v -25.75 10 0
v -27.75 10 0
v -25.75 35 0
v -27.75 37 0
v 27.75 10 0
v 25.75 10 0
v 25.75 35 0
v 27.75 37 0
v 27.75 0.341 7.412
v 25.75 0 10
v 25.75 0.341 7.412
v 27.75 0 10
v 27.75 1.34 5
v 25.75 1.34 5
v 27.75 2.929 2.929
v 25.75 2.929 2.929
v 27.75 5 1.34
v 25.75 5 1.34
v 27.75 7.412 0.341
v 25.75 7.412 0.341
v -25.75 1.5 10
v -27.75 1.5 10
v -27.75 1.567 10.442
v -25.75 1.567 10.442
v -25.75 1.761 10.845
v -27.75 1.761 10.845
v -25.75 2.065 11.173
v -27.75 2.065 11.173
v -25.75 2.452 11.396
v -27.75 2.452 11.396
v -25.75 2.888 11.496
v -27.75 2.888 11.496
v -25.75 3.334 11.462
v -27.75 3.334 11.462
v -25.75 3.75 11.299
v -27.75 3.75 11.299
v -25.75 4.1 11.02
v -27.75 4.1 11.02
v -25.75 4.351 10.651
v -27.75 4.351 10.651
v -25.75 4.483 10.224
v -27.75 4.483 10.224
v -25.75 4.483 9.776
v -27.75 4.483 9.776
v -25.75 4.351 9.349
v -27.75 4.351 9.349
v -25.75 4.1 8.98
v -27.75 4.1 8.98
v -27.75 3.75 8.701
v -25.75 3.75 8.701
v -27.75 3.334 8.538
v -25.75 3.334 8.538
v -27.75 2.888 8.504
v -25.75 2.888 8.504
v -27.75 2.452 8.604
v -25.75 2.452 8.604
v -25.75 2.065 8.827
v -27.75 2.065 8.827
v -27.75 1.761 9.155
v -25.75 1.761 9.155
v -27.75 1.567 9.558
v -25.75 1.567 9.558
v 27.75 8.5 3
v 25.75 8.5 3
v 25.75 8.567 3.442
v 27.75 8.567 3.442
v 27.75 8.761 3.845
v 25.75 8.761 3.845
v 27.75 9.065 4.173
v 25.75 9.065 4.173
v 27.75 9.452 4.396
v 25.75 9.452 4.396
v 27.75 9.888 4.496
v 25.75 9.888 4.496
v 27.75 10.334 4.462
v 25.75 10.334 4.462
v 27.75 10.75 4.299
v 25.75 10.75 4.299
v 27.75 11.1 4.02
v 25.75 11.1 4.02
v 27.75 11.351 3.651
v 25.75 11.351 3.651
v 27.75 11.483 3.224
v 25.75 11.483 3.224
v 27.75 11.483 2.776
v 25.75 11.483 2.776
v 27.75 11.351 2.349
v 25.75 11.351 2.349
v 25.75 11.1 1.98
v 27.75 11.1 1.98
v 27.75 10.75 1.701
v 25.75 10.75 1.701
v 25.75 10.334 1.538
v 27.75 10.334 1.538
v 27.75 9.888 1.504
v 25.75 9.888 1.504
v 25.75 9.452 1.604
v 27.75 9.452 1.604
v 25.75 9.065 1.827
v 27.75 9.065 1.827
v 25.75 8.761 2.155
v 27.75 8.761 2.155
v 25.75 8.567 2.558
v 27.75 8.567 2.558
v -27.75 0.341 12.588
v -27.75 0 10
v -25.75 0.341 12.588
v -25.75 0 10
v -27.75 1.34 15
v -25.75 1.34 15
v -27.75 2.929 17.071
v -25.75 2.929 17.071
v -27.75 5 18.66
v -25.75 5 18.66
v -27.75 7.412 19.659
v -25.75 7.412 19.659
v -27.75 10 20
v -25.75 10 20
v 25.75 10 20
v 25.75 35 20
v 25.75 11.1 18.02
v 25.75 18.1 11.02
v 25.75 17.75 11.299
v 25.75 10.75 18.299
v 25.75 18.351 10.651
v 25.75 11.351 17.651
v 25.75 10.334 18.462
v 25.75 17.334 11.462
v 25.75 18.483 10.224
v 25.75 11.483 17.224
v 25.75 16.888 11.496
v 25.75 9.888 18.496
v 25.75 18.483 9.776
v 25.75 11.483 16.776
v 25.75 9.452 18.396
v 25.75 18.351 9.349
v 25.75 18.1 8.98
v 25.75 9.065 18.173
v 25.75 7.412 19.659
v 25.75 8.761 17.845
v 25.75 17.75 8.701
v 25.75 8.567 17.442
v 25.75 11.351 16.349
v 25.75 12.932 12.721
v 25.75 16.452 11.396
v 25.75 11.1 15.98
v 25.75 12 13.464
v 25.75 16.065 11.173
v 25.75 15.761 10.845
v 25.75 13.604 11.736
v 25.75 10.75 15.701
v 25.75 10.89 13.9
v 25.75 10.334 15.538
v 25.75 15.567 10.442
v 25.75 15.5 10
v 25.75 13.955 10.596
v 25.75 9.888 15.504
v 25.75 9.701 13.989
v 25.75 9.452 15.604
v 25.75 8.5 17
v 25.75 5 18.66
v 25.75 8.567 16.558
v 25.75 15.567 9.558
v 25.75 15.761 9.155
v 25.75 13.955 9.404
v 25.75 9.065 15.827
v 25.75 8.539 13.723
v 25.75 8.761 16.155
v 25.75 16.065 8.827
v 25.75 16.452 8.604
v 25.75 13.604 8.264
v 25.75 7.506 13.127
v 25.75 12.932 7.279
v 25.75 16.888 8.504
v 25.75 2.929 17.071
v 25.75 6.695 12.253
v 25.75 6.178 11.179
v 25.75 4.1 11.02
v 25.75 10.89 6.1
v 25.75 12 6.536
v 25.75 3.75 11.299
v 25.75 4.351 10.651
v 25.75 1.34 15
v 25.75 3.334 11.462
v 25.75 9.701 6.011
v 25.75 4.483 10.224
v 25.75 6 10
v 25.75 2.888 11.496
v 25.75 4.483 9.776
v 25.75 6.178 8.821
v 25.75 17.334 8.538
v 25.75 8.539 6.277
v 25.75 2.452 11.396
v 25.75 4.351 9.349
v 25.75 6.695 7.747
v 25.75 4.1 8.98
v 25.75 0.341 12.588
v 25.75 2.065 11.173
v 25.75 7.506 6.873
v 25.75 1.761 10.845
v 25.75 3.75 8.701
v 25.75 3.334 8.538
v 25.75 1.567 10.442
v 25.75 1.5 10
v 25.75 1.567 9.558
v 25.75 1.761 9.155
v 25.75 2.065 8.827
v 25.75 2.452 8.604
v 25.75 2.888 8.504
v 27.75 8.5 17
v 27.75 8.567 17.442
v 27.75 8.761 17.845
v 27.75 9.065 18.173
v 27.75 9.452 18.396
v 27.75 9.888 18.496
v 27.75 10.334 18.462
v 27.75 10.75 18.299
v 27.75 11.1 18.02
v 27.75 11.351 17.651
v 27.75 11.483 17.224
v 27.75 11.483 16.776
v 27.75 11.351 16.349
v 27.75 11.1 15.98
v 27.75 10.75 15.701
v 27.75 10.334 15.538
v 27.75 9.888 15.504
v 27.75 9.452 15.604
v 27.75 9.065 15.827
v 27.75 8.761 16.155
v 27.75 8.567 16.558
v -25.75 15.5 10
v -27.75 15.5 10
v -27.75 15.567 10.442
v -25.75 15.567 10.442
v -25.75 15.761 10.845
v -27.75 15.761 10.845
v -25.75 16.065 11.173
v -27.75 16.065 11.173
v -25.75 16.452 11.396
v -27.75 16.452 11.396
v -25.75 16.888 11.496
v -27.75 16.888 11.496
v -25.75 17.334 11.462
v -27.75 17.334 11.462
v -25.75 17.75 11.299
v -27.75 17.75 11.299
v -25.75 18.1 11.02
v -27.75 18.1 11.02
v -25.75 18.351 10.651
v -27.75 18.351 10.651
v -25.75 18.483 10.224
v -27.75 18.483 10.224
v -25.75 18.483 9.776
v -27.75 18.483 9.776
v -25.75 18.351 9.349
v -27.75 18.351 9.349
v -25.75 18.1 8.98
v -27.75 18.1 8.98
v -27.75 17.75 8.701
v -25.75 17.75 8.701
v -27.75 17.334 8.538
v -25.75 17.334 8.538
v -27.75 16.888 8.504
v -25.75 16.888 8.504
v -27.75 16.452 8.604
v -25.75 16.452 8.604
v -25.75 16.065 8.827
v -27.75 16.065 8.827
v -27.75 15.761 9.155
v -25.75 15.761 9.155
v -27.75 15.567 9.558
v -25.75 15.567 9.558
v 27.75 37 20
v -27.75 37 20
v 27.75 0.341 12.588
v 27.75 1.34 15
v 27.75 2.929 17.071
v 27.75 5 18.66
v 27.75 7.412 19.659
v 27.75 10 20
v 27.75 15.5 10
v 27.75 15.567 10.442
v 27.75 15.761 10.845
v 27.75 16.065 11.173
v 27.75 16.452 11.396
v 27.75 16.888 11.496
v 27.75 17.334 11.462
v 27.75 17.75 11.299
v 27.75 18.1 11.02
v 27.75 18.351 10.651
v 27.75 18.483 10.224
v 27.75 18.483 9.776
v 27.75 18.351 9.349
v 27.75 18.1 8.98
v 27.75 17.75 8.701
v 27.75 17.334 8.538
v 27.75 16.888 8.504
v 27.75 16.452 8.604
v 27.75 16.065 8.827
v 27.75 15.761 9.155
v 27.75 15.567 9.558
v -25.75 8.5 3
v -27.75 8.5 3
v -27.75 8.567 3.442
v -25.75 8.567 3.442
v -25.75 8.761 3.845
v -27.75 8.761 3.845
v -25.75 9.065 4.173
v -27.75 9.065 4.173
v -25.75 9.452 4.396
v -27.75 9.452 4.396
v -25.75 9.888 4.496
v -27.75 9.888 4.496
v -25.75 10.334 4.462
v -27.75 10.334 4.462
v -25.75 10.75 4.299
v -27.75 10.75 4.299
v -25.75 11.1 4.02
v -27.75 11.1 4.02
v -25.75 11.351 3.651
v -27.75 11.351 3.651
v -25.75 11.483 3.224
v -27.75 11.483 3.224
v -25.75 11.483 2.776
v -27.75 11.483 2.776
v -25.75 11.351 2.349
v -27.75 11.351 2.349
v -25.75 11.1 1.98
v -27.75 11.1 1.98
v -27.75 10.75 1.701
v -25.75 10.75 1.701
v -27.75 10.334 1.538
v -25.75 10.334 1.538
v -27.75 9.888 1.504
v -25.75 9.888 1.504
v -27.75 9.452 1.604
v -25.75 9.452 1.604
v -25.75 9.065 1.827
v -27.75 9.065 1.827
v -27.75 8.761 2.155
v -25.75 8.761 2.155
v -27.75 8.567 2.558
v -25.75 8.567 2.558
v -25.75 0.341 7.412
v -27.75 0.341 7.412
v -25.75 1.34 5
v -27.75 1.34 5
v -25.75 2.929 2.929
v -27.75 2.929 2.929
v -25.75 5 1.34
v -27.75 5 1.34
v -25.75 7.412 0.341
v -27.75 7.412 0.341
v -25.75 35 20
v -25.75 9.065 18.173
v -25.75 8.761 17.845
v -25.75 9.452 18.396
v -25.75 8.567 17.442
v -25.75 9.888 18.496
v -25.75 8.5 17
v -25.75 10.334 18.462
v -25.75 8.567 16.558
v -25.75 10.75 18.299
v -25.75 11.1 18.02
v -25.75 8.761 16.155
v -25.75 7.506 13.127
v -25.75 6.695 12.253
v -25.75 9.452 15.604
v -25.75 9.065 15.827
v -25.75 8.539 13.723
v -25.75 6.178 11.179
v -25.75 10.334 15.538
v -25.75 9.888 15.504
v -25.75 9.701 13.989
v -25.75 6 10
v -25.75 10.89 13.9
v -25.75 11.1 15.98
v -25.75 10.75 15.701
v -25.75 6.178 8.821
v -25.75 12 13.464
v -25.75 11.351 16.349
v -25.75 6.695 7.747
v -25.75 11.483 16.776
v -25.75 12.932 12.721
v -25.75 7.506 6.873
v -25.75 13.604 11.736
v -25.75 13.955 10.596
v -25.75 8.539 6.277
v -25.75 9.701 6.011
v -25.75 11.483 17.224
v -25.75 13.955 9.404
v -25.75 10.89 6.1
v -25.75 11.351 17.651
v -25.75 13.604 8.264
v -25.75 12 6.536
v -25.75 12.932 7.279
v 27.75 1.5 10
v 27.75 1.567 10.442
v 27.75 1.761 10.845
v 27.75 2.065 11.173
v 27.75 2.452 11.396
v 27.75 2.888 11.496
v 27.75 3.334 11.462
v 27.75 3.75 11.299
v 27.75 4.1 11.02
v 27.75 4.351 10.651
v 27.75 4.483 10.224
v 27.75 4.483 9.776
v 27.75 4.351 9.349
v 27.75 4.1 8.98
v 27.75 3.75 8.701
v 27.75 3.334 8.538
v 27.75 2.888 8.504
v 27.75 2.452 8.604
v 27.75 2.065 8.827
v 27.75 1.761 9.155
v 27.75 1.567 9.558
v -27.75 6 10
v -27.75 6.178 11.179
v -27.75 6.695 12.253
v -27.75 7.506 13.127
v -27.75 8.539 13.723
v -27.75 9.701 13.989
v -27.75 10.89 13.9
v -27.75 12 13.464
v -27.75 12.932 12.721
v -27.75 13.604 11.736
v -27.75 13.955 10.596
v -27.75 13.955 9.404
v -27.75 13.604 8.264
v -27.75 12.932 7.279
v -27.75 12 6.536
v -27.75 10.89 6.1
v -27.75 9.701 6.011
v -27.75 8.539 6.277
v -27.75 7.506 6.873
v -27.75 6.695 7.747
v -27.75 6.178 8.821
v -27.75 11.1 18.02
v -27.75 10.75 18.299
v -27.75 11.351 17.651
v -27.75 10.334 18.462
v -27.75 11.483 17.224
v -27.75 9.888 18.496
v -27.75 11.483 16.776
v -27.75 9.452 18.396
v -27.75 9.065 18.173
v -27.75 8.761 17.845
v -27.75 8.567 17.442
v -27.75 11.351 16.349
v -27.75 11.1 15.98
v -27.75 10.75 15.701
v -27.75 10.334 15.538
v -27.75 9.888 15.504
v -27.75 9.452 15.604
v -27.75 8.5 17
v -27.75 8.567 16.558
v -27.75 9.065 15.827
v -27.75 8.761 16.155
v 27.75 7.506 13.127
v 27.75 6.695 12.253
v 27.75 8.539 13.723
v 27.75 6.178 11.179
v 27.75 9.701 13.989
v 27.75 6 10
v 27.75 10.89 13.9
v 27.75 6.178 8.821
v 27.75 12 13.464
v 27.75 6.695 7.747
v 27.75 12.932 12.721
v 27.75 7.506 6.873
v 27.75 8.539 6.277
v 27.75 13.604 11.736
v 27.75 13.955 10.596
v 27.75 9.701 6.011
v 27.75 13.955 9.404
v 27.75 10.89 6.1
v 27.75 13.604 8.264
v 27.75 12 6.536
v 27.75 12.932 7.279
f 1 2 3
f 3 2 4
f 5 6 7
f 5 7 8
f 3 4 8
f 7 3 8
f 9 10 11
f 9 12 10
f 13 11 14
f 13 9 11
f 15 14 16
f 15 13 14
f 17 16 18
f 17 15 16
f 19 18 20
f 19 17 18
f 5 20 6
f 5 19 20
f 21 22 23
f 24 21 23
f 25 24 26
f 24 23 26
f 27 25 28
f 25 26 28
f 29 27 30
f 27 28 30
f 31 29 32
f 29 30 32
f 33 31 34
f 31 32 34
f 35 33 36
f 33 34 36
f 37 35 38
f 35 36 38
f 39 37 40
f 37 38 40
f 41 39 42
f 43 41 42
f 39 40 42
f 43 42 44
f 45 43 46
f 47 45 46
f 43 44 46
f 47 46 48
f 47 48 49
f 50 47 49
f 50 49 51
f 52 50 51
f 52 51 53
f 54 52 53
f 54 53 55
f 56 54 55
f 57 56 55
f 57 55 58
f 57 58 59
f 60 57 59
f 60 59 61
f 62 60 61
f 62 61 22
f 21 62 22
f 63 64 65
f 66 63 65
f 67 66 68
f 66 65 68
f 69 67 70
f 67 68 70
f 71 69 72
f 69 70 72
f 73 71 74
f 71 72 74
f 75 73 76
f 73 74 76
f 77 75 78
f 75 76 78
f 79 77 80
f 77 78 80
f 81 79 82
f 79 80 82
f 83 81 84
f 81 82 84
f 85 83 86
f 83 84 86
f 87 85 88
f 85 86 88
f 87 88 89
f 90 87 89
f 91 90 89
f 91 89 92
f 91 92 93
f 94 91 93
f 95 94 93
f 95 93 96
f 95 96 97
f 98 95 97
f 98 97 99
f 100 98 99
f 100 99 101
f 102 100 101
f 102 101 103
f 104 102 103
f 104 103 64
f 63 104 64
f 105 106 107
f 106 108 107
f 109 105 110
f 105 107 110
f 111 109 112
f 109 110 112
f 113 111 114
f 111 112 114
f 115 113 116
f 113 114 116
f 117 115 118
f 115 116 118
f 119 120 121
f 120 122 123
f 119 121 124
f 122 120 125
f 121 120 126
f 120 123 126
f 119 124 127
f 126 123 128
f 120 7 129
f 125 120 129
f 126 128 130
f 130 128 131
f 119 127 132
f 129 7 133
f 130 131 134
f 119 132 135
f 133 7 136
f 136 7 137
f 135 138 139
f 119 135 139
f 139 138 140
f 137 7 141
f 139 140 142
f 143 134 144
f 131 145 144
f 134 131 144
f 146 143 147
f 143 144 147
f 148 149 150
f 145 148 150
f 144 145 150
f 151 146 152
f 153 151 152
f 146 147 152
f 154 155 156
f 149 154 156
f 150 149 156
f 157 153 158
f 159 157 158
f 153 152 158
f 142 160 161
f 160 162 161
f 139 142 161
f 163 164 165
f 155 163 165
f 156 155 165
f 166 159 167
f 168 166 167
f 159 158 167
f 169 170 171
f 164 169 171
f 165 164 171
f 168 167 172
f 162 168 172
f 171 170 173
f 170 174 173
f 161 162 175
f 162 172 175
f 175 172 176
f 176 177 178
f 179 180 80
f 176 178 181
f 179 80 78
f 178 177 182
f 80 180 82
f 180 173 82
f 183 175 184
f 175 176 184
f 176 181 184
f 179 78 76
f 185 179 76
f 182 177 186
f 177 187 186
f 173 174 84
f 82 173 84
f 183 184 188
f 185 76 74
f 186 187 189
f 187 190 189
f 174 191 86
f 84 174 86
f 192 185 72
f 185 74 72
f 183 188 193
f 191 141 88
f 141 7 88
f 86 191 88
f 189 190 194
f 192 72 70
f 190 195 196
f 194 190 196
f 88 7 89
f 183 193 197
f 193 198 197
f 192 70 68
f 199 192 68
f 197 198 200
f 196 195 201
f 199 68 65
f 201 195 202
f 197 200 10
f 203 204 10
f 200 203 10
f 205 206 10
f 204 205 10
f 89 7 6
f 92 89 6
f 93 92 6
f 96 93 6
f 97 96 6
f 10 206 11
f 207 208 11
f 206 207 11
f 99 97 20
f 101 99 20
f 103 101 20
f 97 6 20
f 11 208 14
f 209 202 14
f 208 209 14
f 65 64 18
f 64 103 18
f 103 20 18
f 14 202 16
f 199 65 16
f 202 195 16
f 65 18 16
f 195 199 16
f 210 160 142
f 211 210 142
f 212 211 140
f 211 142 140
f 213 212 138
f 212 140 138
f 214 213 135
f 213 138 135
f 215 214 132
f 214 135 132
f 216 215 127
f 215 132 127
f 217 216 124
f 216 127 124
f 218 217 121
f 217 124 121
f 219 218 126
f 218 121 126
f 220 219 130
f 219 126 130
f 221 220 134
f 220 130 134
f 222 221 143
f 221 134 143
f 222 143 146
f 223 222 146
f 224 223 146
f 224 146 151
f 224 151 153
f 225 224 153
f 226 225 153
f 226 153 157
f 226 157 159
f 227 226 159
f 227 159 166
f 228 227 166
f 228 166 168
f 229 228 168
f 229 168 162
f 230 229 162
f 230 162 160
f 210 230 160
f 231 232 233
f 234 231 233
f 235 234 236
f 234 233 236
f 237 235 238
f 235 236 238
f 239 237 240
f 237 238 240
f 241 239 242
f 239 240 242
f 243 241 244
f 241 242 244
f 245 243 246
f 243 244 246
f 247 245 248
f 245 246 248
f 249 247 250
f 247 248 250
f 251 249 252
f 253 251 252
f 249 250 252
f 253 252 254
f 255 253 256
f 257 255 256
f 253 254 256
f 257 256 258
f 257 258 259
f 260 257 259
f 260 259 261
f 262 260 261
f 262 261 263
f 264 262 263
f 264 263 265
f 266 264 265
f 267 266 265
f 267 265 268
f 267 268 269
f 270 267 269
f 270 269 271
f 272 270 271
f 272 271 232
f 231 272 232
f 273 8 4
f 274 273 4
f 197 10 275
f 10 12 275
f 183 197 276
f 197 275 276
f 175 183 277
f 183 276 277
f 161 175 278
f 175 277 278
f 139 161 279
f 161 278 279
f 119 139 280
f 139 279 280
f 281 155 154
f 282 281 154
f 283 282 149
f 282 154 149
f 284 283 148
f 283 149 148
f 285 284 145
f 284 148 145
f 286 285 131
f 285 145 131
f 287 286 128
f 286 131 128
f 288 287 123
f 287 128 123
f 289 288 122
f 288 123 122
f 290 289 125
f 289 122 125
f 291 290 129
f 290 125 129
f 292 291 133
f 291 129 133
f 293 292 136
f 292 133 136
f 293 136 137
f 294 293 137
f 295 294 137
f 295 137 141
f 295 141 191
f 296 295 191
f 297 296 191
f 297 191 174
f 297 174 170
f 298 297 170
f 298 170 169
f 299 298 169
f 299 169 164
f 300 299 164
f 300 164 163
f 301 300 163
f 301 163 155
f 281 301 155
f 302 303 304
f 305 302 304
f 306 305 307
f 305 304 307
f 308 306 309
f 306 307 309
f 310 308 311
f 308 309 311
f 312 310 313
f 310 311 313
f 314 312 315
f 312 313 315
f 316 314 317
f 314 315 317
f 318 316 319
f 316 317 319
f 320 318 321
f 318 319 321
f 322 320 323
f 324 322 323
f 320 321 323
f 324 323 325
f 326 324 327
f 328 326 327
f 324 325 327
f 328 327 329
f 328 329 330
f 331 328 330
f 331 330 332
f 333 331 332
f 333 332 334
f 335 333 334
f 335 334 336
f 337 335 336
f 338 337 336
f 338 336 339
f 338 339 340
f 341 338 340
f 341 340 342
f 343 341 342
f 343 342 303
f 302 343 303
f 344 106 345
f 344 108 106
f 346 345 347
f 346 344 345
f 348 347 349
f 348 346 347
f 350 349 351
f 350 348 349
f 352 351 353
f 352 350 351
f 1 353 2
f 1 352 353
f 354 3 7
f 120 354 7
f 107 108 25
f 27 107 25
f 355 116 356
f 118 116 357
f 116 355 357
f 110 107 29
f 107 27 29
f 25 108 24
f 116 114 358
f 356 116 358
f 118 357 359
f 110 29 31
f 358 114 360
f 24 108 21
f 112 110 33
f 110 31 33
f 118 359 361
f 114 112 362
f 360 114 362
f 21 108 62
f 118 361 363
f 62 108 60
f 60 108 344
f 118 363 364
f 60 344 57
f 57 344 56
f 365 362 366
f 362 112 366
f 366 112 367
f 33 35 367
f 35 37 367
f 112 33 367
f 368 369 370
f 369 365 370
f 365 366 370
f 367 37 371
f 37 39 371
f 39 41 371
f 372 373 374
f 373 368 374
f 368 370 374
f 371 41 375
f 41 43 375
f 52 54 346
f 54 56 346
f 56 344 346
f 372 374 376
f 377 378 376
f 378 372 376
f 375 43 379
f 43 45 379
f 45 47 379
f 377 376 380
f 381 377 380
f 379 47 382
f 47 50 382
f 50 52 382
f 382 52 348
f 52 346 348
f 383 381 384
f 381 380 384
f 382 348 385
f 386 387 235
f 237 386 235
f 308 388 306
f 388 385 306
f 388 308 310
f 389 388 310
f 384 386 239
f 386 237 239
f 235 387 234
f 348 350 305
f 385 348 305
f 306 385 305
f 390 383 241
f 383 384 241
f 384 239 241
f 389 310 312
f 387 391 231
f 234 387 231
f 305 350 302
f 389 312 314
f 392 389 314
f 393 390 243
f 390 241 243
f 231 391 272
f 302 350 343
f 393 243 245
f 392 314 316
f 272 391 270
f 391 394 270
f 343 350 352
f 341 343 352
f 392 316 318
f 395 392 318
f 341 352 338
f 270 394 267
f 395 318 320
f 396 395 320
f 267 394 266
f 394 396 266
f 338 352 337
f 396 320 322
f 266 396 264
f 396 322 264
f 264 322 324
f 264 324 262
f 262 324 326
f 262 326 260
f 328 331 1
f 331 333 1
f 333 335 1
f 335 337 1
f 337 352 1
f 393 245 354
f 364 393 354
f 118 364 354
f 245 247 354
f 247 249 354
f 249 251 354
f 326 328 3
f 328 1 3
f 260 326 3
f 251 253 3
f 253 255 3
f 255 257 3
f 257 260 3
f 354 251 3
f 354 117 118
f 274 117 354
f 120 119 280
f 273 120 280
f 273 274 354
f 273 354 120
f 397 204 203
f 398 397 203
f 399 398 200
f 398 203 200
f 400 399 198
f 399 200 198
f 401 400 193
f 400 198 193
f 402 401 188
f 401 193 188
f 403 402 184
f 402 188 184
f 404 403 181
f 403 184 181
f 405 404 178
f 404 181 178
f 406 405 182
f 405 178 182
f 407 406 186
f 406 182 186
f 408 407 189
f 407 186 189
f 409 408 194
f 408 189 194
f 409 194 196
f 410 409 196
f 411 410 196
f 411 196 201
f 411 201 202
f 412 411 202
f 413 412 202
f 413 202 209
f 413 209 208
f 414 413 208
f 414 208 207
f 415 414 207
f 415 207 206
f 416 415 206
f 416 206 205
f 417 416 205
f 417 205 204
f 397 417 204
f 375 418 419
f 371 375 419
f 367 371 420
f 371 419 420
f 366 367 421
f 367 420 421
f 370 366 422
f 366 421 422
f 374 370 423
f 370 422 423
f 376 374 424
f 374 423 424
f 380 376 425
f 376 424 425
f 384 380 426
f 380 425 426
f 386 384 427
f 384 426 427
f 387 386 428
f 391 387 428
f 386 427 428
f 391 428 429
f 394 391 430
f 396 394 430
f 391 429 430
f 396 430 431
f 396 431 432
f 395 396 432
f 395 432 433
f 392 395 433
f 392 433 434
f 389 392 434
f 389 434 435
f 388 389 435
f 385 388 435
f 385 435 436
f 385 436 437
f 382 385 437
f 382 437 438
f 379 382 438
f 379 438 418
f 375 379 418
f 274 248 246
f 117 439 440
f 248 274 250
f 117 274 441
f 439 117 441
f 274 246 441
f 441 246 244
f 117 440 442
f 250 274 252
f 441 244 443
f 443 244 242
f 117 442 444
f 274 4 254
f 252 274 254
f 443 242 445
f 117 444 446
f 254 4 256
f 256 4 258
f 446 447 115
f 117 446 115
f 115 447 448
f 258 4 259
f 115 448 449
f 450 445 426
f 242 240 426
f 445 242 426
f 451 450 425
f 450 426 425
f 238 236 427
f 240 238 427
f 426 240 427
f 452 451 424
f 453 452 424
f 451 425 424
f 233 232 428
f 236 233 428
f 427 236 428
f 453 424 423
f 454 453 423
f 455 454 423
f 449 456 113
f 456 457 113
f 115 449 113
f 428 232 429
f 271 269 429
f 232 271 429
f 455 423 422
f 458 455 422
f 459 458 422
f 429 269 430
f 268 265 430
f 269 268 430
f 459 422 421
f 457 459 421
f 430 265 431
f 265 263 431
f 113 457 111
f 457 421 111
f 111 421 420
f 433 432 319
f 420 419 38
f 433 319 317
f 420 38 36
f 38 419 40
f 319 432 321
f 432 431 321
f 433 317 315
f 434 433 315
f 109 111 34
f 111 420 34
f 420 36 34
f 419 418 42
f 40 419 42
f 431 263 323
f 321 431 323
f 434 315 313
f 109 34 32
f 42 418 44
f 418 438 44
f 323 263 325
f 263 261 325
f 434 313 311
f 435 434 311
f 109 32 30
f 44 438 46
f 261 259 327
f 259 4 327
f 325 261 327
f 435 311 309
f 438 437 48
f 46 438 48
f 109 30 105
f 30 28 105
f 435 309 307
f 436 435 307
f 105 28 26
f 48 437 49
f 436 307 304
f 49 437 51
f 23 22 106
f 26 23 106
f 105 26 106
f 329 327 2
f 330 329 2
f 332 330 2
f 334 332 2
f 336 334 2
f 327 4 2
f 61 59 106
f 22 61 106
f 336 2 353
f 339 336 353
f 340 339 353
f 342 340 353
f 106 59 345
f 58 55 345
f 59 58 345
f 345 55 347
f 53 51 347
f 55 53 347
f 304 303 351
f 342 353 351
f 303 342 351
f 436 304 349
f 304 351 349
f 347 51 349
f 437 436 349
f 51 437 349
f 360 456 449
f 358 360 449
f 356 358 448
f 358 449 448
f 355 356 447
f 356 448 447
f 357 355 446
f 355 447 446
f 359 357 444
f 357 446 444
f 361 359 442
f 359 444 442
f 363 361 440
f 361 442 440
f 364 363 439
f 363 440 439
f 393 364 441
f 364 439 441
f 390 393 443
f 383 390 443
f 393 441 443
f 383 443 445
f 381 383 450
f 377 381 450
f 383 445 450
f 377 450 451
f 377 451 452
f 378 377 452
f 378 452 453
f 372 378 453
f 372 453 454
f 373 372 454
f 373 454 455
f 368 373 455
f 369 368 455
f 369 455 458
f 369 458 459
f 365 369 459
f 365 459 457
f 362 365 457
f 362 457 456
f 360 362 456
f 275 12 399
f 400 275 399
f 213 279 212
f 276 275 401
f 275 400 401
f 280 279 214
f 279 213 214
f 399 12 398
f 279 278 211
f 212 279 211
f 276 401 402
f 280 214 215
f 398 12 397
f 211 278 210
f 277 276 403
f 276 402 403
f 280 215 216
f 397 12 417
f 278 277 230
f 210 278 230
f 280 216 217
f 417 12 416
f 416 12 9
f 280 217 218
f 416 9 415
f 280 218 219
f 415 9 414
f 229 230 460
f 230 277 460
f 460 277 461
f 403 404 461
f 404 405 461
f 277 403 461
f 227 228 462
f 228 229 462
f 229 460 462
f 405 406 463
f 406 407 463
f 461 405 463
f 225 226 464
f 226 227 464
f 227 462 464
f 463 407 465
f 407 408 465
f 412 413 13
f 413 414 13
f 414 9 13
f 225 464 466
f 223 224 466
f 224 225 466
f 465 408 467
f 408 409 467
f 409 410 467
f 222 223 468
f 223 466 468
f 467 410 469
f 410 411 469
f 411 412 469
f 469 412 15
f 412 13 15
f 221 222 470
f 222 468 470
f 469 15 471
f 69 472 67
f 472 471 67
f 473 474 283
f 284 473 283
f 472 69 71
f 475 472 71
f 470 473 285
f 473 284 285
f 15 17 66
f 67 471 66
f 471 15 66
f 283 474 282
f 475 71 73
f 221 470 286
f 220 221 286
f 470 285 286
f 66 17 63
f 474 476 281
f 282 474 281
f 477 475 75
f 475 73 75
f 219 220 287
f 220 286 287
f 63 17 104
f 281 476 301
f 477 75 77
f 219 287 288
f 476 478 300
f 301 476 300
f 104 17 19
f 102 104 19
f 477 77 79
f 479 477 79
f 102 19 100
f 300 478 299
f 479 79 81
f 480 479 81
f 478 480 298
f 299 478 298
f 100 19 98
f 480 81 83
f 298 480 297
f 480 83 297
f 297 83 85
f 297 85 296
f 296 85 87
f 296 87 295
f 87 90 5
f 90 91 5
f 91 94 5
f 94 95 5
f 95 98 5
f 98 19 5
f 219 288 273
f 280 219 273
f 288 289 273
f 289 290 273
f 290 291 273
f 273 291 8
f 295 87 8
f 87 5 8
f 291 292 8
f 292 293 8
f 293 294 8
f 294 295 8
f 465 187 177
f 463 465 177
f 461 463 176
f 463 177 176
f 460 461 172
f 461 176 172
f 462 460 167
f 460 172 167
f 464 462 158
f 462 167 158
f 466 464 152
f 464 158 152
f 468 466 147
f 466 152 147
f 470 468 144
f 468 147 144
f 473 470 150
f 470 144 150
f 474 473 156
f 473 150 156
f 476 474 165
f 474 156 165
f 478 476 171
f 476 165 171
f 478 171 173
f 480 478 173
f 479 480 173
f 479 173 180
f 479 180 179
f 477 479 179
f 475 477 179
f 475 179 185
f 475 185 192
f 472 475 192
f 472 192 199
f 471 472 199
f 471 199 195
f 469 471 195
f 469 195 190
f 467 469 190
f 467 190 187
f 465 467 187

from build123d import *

# Parameters (mm, degrees)
F1_DEPTH = 20
F2_R     = 9.99999
F3_R     = 4
F3_R_2   = 1.5
F4_DEPTH = 55.501


# Not quite as in the source:
# - a fillet or chamfer is up to 0.001 mm smaller than in the source, because OpenCascade refuses the exact size


with BuildPart() as f1:
    # F0 (on Top) → F1 (new body)
    with BuildSketch(Plane.XY):
        Polygon((-27.75, 37), (-27.75, 0), (-25.75, 0), (-25.75, 35), (25.75, 35), (25.75, 0), (27.75, 0), (27.75, 37), align=None)
    extrude(amount=F1_DEPTH)

    # F2 (radius 10 in the source; OpenCascade refuses exactly that, so slightly less here)
    f2_edges = [f1.edges().sort_by_distance(p)[0] for p in [
        (-26.75, 0, 0),
        (-26.75, 0, 20),
        (26.75, 0, 0),
        (26.75, 0, 20),
    ]]
    fillet(f2_edges, radius=F2_R)

    # F3 (on face) → F4 (cut, through all)
    with BuildSketch(Plane(origin=(-27.75, 0, 0), x_dir=(0, -1, 0), z_dir=(-1, 0, 0))):
        with Locations((-10, 10)):
            Circle(F3_R)
        with Locations((-10, 3)):
            Circle(F3_R_2)
        with Locations((-10, 17)):
            Circle(F3_R_2)
        with Locations((-3, 10)):
            Circle(F3_R_2)
        with Locations((-17, 10)):
            Circle(F3_R_2)
    extrude(amount=-F4_DEPTH, mode=Mode.SUBTRACT)


solid = f1.part
